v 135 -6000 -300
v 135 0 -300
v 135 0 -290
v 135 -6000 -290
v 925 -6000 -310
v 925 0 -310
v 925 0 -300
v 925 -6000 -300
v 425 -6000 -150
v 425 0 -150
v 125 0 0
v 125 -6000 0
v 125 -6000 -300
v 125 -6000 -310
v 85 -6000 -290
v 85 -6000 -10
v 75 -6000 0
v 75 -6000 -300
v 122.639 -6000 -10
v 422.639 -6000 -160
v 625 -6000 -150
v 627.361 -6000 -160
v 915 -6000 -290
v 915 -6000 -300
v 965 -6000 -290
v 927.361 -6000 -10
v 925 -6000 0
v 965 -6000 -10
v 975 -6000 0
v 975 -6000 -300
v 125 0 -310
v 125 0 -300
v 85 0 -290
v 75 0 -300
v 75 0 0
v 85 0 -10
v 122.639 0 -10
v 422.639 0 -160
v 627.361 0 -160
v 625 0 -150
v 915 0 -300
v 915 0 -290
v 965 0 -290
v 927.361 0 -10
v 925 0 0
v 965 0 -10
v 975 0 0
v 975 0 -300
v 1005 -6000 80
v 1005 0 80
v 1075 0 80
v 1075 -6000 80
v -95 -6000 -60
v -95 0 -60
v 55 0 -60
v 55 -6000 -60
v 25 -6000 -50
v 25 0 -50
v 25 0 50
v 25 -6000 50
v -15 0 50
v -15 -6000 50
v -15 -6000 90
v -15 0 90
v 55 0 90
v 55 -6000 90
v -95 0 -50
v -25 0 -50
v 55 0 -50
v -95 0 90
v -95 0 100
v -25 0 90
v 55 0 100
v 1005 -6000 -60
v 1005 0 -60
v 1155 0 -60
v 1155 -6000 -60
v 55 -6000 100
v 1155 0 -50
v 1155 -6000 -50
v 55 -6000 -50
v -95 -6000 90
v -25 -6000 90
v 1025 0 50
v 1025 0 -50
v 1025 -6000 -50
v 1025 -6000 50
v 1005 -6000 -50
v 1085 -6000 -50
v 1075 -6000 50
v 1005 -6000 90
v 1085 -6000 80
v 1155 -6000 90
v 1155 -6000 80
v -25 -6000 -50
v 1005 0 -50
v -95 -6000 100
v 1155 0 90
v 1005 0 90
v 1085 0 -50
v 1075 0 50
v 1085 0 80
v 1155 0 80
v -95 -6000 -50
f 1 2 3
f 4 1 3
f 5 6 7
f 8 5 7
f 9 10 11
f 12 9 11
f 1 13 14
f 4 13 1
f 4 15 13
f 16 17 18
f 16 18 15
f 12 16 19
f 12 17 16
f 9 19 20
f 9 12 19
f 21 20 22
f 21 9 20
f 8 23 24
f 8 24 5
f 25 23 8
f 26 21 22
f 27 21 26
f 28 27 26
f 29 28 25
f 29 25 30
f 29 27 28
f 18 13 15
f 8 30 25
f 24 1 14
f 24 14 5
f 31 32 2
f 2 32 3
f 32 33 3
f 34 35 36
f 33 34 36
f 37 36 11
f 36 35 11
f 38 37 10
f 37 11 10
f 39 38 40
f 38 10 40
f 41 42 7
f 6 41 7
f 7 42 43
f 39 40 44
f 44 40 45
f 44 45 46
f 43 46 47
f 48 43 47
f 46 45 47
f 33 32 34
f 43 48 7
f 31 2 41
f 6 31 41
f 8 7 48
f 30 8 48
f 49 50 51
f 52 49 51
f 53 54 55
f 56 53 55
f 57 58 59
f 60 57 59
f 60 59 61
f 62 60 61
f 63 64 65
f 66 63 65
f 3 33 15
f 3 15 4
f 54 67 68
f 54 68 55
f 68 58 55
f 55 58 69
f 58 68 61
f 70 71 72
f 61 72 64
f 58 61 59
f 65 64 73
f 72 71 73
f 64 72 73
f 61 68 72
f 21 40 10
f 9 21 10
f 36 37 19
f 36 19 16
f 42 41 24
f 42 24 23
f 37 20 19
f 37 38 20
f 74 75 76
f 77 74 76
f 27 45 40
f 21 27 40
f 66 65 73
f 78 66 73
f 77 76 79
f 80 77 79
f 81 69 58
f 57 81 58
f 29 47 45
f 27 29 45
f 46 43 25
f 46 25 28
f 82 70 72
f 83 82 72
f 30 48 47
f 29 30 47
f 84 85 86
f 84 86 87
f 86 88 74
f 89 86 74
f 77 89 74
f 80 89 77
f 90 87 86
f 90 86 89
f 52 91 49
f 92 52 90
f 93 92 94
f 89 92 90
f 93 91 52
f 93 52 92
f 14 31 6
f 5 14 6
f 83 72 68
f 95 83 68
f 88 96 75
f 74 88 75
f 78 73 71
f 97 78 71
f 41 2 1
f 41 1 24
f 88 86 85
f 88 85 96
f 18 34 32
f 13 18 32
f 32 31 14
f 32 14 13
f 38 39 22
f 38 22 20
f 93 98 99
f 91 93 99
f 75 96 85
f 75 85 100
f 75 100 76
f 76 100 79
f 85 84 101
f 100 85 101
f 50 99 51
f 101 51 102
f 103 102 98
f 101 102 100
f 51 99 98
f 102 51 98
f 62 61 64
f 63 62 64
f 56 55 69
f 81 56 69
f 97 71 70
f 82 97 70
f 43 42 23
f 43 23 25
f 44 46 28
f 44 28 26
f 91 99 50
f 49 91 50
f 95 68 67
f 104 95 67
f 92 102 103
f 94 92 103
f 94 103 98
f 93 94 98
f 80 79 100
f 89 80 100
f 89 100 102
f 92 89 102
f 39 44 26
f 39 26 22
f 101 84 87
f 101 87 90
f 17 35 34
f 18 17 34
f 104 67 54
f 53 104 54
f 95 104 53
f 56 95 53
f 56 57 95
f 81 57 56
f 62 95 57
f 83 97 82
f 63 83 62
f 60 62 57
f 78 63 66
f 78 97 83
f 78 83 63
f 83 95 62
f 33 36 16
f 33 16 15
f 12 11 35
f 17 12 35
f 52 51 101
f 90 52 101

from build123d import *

# Parameters (mm, degrees)
F0_W     = 40
F0_H     = 100
F0_W_2   = 10
F0_H_2   = 40
F1_DEPTH = 6000
F0_W_3   = 50
F0_W_4   = 800
F0_H_3   = 10
F2_T     = -10


with BuildPart() as f1:
    # F0 (on Front) → F1 (new body)
    with BuildSketch(Plane.XZ):
        with Locations((5, 0)):
            Rectangle(F0_W, F0_H)
        with Locations((-20, 0)):
            Rectangle(F0_W_2, F0_H)
        with Locations((-20, 70)):
            Rectangle(F0_W_2, F0_H_2)
        Polygon((55, -50), (25, -50), (-15, -50), (-25, -50), (-95, -50), (-95, -60), (55, -60), align=None)
        Polygon((-25, 90), (-15, 90), (55, 90), (55, 100), (-95, 100), (-95, 90), align=None)
    extrude(amount=F1_DEPTH)


with BuildPart() as f1b:
    # F0 (on Front) → F1, piece 2 (new body)
    with BuildSketch(Plane.XZ):
        with Locations((1050, 0)):
            Rectangle(F0_W_3, F0_H)
        Polygon((1075, 80), (1075, 50), (1075, -50), (1025, -50), (1005, -50), (1005, -60), (1155, -60), (1155, -50), (1085, -50), (1085, 80), (1155, 80), (1155, 90), (1005, 90), (1005, 80), align=None)
    extrude(amount=F1_DEPTH)


with BuildPart() as f1c:
    # F0 (on Front) → F1, piece 3 (new body)
    with BuildSketch(Plane.XZ):
        Polygon((125, 0), (75, 0), (75, -300), (125, -300), (125, -10), align=None)
        Polygon((425, -150), (125, 0), (125, -10), (425, -160), (625, -160), (925, -10), (925, 0), (625, -150), align=None)
        Polygon((125, -10), (125, -300), (925, -300), (925, -10), (625, -160), (425, -160), align=None)
        with Locations((525, -305)):
            Rectangle(F0_W_4, F0_H_3)
        Polygon((925, -10), (925, -300), (975, -300), (975, 0), (925, 0), align=None)
    extrude(amount=F1_DEPTH)

    # F2
    f2_openings = [f1c.faces().sort_by_distance(p)[0] for p in [
        (525, 0, -189.359606),
        (525, -6000, -189.359606),
    ]]
    offset(amount=F2_T, openings=f2_openings, kind=Kind.INTERSECTION)


solid = Compound([f1.part, f1b.part, f1c.part])
